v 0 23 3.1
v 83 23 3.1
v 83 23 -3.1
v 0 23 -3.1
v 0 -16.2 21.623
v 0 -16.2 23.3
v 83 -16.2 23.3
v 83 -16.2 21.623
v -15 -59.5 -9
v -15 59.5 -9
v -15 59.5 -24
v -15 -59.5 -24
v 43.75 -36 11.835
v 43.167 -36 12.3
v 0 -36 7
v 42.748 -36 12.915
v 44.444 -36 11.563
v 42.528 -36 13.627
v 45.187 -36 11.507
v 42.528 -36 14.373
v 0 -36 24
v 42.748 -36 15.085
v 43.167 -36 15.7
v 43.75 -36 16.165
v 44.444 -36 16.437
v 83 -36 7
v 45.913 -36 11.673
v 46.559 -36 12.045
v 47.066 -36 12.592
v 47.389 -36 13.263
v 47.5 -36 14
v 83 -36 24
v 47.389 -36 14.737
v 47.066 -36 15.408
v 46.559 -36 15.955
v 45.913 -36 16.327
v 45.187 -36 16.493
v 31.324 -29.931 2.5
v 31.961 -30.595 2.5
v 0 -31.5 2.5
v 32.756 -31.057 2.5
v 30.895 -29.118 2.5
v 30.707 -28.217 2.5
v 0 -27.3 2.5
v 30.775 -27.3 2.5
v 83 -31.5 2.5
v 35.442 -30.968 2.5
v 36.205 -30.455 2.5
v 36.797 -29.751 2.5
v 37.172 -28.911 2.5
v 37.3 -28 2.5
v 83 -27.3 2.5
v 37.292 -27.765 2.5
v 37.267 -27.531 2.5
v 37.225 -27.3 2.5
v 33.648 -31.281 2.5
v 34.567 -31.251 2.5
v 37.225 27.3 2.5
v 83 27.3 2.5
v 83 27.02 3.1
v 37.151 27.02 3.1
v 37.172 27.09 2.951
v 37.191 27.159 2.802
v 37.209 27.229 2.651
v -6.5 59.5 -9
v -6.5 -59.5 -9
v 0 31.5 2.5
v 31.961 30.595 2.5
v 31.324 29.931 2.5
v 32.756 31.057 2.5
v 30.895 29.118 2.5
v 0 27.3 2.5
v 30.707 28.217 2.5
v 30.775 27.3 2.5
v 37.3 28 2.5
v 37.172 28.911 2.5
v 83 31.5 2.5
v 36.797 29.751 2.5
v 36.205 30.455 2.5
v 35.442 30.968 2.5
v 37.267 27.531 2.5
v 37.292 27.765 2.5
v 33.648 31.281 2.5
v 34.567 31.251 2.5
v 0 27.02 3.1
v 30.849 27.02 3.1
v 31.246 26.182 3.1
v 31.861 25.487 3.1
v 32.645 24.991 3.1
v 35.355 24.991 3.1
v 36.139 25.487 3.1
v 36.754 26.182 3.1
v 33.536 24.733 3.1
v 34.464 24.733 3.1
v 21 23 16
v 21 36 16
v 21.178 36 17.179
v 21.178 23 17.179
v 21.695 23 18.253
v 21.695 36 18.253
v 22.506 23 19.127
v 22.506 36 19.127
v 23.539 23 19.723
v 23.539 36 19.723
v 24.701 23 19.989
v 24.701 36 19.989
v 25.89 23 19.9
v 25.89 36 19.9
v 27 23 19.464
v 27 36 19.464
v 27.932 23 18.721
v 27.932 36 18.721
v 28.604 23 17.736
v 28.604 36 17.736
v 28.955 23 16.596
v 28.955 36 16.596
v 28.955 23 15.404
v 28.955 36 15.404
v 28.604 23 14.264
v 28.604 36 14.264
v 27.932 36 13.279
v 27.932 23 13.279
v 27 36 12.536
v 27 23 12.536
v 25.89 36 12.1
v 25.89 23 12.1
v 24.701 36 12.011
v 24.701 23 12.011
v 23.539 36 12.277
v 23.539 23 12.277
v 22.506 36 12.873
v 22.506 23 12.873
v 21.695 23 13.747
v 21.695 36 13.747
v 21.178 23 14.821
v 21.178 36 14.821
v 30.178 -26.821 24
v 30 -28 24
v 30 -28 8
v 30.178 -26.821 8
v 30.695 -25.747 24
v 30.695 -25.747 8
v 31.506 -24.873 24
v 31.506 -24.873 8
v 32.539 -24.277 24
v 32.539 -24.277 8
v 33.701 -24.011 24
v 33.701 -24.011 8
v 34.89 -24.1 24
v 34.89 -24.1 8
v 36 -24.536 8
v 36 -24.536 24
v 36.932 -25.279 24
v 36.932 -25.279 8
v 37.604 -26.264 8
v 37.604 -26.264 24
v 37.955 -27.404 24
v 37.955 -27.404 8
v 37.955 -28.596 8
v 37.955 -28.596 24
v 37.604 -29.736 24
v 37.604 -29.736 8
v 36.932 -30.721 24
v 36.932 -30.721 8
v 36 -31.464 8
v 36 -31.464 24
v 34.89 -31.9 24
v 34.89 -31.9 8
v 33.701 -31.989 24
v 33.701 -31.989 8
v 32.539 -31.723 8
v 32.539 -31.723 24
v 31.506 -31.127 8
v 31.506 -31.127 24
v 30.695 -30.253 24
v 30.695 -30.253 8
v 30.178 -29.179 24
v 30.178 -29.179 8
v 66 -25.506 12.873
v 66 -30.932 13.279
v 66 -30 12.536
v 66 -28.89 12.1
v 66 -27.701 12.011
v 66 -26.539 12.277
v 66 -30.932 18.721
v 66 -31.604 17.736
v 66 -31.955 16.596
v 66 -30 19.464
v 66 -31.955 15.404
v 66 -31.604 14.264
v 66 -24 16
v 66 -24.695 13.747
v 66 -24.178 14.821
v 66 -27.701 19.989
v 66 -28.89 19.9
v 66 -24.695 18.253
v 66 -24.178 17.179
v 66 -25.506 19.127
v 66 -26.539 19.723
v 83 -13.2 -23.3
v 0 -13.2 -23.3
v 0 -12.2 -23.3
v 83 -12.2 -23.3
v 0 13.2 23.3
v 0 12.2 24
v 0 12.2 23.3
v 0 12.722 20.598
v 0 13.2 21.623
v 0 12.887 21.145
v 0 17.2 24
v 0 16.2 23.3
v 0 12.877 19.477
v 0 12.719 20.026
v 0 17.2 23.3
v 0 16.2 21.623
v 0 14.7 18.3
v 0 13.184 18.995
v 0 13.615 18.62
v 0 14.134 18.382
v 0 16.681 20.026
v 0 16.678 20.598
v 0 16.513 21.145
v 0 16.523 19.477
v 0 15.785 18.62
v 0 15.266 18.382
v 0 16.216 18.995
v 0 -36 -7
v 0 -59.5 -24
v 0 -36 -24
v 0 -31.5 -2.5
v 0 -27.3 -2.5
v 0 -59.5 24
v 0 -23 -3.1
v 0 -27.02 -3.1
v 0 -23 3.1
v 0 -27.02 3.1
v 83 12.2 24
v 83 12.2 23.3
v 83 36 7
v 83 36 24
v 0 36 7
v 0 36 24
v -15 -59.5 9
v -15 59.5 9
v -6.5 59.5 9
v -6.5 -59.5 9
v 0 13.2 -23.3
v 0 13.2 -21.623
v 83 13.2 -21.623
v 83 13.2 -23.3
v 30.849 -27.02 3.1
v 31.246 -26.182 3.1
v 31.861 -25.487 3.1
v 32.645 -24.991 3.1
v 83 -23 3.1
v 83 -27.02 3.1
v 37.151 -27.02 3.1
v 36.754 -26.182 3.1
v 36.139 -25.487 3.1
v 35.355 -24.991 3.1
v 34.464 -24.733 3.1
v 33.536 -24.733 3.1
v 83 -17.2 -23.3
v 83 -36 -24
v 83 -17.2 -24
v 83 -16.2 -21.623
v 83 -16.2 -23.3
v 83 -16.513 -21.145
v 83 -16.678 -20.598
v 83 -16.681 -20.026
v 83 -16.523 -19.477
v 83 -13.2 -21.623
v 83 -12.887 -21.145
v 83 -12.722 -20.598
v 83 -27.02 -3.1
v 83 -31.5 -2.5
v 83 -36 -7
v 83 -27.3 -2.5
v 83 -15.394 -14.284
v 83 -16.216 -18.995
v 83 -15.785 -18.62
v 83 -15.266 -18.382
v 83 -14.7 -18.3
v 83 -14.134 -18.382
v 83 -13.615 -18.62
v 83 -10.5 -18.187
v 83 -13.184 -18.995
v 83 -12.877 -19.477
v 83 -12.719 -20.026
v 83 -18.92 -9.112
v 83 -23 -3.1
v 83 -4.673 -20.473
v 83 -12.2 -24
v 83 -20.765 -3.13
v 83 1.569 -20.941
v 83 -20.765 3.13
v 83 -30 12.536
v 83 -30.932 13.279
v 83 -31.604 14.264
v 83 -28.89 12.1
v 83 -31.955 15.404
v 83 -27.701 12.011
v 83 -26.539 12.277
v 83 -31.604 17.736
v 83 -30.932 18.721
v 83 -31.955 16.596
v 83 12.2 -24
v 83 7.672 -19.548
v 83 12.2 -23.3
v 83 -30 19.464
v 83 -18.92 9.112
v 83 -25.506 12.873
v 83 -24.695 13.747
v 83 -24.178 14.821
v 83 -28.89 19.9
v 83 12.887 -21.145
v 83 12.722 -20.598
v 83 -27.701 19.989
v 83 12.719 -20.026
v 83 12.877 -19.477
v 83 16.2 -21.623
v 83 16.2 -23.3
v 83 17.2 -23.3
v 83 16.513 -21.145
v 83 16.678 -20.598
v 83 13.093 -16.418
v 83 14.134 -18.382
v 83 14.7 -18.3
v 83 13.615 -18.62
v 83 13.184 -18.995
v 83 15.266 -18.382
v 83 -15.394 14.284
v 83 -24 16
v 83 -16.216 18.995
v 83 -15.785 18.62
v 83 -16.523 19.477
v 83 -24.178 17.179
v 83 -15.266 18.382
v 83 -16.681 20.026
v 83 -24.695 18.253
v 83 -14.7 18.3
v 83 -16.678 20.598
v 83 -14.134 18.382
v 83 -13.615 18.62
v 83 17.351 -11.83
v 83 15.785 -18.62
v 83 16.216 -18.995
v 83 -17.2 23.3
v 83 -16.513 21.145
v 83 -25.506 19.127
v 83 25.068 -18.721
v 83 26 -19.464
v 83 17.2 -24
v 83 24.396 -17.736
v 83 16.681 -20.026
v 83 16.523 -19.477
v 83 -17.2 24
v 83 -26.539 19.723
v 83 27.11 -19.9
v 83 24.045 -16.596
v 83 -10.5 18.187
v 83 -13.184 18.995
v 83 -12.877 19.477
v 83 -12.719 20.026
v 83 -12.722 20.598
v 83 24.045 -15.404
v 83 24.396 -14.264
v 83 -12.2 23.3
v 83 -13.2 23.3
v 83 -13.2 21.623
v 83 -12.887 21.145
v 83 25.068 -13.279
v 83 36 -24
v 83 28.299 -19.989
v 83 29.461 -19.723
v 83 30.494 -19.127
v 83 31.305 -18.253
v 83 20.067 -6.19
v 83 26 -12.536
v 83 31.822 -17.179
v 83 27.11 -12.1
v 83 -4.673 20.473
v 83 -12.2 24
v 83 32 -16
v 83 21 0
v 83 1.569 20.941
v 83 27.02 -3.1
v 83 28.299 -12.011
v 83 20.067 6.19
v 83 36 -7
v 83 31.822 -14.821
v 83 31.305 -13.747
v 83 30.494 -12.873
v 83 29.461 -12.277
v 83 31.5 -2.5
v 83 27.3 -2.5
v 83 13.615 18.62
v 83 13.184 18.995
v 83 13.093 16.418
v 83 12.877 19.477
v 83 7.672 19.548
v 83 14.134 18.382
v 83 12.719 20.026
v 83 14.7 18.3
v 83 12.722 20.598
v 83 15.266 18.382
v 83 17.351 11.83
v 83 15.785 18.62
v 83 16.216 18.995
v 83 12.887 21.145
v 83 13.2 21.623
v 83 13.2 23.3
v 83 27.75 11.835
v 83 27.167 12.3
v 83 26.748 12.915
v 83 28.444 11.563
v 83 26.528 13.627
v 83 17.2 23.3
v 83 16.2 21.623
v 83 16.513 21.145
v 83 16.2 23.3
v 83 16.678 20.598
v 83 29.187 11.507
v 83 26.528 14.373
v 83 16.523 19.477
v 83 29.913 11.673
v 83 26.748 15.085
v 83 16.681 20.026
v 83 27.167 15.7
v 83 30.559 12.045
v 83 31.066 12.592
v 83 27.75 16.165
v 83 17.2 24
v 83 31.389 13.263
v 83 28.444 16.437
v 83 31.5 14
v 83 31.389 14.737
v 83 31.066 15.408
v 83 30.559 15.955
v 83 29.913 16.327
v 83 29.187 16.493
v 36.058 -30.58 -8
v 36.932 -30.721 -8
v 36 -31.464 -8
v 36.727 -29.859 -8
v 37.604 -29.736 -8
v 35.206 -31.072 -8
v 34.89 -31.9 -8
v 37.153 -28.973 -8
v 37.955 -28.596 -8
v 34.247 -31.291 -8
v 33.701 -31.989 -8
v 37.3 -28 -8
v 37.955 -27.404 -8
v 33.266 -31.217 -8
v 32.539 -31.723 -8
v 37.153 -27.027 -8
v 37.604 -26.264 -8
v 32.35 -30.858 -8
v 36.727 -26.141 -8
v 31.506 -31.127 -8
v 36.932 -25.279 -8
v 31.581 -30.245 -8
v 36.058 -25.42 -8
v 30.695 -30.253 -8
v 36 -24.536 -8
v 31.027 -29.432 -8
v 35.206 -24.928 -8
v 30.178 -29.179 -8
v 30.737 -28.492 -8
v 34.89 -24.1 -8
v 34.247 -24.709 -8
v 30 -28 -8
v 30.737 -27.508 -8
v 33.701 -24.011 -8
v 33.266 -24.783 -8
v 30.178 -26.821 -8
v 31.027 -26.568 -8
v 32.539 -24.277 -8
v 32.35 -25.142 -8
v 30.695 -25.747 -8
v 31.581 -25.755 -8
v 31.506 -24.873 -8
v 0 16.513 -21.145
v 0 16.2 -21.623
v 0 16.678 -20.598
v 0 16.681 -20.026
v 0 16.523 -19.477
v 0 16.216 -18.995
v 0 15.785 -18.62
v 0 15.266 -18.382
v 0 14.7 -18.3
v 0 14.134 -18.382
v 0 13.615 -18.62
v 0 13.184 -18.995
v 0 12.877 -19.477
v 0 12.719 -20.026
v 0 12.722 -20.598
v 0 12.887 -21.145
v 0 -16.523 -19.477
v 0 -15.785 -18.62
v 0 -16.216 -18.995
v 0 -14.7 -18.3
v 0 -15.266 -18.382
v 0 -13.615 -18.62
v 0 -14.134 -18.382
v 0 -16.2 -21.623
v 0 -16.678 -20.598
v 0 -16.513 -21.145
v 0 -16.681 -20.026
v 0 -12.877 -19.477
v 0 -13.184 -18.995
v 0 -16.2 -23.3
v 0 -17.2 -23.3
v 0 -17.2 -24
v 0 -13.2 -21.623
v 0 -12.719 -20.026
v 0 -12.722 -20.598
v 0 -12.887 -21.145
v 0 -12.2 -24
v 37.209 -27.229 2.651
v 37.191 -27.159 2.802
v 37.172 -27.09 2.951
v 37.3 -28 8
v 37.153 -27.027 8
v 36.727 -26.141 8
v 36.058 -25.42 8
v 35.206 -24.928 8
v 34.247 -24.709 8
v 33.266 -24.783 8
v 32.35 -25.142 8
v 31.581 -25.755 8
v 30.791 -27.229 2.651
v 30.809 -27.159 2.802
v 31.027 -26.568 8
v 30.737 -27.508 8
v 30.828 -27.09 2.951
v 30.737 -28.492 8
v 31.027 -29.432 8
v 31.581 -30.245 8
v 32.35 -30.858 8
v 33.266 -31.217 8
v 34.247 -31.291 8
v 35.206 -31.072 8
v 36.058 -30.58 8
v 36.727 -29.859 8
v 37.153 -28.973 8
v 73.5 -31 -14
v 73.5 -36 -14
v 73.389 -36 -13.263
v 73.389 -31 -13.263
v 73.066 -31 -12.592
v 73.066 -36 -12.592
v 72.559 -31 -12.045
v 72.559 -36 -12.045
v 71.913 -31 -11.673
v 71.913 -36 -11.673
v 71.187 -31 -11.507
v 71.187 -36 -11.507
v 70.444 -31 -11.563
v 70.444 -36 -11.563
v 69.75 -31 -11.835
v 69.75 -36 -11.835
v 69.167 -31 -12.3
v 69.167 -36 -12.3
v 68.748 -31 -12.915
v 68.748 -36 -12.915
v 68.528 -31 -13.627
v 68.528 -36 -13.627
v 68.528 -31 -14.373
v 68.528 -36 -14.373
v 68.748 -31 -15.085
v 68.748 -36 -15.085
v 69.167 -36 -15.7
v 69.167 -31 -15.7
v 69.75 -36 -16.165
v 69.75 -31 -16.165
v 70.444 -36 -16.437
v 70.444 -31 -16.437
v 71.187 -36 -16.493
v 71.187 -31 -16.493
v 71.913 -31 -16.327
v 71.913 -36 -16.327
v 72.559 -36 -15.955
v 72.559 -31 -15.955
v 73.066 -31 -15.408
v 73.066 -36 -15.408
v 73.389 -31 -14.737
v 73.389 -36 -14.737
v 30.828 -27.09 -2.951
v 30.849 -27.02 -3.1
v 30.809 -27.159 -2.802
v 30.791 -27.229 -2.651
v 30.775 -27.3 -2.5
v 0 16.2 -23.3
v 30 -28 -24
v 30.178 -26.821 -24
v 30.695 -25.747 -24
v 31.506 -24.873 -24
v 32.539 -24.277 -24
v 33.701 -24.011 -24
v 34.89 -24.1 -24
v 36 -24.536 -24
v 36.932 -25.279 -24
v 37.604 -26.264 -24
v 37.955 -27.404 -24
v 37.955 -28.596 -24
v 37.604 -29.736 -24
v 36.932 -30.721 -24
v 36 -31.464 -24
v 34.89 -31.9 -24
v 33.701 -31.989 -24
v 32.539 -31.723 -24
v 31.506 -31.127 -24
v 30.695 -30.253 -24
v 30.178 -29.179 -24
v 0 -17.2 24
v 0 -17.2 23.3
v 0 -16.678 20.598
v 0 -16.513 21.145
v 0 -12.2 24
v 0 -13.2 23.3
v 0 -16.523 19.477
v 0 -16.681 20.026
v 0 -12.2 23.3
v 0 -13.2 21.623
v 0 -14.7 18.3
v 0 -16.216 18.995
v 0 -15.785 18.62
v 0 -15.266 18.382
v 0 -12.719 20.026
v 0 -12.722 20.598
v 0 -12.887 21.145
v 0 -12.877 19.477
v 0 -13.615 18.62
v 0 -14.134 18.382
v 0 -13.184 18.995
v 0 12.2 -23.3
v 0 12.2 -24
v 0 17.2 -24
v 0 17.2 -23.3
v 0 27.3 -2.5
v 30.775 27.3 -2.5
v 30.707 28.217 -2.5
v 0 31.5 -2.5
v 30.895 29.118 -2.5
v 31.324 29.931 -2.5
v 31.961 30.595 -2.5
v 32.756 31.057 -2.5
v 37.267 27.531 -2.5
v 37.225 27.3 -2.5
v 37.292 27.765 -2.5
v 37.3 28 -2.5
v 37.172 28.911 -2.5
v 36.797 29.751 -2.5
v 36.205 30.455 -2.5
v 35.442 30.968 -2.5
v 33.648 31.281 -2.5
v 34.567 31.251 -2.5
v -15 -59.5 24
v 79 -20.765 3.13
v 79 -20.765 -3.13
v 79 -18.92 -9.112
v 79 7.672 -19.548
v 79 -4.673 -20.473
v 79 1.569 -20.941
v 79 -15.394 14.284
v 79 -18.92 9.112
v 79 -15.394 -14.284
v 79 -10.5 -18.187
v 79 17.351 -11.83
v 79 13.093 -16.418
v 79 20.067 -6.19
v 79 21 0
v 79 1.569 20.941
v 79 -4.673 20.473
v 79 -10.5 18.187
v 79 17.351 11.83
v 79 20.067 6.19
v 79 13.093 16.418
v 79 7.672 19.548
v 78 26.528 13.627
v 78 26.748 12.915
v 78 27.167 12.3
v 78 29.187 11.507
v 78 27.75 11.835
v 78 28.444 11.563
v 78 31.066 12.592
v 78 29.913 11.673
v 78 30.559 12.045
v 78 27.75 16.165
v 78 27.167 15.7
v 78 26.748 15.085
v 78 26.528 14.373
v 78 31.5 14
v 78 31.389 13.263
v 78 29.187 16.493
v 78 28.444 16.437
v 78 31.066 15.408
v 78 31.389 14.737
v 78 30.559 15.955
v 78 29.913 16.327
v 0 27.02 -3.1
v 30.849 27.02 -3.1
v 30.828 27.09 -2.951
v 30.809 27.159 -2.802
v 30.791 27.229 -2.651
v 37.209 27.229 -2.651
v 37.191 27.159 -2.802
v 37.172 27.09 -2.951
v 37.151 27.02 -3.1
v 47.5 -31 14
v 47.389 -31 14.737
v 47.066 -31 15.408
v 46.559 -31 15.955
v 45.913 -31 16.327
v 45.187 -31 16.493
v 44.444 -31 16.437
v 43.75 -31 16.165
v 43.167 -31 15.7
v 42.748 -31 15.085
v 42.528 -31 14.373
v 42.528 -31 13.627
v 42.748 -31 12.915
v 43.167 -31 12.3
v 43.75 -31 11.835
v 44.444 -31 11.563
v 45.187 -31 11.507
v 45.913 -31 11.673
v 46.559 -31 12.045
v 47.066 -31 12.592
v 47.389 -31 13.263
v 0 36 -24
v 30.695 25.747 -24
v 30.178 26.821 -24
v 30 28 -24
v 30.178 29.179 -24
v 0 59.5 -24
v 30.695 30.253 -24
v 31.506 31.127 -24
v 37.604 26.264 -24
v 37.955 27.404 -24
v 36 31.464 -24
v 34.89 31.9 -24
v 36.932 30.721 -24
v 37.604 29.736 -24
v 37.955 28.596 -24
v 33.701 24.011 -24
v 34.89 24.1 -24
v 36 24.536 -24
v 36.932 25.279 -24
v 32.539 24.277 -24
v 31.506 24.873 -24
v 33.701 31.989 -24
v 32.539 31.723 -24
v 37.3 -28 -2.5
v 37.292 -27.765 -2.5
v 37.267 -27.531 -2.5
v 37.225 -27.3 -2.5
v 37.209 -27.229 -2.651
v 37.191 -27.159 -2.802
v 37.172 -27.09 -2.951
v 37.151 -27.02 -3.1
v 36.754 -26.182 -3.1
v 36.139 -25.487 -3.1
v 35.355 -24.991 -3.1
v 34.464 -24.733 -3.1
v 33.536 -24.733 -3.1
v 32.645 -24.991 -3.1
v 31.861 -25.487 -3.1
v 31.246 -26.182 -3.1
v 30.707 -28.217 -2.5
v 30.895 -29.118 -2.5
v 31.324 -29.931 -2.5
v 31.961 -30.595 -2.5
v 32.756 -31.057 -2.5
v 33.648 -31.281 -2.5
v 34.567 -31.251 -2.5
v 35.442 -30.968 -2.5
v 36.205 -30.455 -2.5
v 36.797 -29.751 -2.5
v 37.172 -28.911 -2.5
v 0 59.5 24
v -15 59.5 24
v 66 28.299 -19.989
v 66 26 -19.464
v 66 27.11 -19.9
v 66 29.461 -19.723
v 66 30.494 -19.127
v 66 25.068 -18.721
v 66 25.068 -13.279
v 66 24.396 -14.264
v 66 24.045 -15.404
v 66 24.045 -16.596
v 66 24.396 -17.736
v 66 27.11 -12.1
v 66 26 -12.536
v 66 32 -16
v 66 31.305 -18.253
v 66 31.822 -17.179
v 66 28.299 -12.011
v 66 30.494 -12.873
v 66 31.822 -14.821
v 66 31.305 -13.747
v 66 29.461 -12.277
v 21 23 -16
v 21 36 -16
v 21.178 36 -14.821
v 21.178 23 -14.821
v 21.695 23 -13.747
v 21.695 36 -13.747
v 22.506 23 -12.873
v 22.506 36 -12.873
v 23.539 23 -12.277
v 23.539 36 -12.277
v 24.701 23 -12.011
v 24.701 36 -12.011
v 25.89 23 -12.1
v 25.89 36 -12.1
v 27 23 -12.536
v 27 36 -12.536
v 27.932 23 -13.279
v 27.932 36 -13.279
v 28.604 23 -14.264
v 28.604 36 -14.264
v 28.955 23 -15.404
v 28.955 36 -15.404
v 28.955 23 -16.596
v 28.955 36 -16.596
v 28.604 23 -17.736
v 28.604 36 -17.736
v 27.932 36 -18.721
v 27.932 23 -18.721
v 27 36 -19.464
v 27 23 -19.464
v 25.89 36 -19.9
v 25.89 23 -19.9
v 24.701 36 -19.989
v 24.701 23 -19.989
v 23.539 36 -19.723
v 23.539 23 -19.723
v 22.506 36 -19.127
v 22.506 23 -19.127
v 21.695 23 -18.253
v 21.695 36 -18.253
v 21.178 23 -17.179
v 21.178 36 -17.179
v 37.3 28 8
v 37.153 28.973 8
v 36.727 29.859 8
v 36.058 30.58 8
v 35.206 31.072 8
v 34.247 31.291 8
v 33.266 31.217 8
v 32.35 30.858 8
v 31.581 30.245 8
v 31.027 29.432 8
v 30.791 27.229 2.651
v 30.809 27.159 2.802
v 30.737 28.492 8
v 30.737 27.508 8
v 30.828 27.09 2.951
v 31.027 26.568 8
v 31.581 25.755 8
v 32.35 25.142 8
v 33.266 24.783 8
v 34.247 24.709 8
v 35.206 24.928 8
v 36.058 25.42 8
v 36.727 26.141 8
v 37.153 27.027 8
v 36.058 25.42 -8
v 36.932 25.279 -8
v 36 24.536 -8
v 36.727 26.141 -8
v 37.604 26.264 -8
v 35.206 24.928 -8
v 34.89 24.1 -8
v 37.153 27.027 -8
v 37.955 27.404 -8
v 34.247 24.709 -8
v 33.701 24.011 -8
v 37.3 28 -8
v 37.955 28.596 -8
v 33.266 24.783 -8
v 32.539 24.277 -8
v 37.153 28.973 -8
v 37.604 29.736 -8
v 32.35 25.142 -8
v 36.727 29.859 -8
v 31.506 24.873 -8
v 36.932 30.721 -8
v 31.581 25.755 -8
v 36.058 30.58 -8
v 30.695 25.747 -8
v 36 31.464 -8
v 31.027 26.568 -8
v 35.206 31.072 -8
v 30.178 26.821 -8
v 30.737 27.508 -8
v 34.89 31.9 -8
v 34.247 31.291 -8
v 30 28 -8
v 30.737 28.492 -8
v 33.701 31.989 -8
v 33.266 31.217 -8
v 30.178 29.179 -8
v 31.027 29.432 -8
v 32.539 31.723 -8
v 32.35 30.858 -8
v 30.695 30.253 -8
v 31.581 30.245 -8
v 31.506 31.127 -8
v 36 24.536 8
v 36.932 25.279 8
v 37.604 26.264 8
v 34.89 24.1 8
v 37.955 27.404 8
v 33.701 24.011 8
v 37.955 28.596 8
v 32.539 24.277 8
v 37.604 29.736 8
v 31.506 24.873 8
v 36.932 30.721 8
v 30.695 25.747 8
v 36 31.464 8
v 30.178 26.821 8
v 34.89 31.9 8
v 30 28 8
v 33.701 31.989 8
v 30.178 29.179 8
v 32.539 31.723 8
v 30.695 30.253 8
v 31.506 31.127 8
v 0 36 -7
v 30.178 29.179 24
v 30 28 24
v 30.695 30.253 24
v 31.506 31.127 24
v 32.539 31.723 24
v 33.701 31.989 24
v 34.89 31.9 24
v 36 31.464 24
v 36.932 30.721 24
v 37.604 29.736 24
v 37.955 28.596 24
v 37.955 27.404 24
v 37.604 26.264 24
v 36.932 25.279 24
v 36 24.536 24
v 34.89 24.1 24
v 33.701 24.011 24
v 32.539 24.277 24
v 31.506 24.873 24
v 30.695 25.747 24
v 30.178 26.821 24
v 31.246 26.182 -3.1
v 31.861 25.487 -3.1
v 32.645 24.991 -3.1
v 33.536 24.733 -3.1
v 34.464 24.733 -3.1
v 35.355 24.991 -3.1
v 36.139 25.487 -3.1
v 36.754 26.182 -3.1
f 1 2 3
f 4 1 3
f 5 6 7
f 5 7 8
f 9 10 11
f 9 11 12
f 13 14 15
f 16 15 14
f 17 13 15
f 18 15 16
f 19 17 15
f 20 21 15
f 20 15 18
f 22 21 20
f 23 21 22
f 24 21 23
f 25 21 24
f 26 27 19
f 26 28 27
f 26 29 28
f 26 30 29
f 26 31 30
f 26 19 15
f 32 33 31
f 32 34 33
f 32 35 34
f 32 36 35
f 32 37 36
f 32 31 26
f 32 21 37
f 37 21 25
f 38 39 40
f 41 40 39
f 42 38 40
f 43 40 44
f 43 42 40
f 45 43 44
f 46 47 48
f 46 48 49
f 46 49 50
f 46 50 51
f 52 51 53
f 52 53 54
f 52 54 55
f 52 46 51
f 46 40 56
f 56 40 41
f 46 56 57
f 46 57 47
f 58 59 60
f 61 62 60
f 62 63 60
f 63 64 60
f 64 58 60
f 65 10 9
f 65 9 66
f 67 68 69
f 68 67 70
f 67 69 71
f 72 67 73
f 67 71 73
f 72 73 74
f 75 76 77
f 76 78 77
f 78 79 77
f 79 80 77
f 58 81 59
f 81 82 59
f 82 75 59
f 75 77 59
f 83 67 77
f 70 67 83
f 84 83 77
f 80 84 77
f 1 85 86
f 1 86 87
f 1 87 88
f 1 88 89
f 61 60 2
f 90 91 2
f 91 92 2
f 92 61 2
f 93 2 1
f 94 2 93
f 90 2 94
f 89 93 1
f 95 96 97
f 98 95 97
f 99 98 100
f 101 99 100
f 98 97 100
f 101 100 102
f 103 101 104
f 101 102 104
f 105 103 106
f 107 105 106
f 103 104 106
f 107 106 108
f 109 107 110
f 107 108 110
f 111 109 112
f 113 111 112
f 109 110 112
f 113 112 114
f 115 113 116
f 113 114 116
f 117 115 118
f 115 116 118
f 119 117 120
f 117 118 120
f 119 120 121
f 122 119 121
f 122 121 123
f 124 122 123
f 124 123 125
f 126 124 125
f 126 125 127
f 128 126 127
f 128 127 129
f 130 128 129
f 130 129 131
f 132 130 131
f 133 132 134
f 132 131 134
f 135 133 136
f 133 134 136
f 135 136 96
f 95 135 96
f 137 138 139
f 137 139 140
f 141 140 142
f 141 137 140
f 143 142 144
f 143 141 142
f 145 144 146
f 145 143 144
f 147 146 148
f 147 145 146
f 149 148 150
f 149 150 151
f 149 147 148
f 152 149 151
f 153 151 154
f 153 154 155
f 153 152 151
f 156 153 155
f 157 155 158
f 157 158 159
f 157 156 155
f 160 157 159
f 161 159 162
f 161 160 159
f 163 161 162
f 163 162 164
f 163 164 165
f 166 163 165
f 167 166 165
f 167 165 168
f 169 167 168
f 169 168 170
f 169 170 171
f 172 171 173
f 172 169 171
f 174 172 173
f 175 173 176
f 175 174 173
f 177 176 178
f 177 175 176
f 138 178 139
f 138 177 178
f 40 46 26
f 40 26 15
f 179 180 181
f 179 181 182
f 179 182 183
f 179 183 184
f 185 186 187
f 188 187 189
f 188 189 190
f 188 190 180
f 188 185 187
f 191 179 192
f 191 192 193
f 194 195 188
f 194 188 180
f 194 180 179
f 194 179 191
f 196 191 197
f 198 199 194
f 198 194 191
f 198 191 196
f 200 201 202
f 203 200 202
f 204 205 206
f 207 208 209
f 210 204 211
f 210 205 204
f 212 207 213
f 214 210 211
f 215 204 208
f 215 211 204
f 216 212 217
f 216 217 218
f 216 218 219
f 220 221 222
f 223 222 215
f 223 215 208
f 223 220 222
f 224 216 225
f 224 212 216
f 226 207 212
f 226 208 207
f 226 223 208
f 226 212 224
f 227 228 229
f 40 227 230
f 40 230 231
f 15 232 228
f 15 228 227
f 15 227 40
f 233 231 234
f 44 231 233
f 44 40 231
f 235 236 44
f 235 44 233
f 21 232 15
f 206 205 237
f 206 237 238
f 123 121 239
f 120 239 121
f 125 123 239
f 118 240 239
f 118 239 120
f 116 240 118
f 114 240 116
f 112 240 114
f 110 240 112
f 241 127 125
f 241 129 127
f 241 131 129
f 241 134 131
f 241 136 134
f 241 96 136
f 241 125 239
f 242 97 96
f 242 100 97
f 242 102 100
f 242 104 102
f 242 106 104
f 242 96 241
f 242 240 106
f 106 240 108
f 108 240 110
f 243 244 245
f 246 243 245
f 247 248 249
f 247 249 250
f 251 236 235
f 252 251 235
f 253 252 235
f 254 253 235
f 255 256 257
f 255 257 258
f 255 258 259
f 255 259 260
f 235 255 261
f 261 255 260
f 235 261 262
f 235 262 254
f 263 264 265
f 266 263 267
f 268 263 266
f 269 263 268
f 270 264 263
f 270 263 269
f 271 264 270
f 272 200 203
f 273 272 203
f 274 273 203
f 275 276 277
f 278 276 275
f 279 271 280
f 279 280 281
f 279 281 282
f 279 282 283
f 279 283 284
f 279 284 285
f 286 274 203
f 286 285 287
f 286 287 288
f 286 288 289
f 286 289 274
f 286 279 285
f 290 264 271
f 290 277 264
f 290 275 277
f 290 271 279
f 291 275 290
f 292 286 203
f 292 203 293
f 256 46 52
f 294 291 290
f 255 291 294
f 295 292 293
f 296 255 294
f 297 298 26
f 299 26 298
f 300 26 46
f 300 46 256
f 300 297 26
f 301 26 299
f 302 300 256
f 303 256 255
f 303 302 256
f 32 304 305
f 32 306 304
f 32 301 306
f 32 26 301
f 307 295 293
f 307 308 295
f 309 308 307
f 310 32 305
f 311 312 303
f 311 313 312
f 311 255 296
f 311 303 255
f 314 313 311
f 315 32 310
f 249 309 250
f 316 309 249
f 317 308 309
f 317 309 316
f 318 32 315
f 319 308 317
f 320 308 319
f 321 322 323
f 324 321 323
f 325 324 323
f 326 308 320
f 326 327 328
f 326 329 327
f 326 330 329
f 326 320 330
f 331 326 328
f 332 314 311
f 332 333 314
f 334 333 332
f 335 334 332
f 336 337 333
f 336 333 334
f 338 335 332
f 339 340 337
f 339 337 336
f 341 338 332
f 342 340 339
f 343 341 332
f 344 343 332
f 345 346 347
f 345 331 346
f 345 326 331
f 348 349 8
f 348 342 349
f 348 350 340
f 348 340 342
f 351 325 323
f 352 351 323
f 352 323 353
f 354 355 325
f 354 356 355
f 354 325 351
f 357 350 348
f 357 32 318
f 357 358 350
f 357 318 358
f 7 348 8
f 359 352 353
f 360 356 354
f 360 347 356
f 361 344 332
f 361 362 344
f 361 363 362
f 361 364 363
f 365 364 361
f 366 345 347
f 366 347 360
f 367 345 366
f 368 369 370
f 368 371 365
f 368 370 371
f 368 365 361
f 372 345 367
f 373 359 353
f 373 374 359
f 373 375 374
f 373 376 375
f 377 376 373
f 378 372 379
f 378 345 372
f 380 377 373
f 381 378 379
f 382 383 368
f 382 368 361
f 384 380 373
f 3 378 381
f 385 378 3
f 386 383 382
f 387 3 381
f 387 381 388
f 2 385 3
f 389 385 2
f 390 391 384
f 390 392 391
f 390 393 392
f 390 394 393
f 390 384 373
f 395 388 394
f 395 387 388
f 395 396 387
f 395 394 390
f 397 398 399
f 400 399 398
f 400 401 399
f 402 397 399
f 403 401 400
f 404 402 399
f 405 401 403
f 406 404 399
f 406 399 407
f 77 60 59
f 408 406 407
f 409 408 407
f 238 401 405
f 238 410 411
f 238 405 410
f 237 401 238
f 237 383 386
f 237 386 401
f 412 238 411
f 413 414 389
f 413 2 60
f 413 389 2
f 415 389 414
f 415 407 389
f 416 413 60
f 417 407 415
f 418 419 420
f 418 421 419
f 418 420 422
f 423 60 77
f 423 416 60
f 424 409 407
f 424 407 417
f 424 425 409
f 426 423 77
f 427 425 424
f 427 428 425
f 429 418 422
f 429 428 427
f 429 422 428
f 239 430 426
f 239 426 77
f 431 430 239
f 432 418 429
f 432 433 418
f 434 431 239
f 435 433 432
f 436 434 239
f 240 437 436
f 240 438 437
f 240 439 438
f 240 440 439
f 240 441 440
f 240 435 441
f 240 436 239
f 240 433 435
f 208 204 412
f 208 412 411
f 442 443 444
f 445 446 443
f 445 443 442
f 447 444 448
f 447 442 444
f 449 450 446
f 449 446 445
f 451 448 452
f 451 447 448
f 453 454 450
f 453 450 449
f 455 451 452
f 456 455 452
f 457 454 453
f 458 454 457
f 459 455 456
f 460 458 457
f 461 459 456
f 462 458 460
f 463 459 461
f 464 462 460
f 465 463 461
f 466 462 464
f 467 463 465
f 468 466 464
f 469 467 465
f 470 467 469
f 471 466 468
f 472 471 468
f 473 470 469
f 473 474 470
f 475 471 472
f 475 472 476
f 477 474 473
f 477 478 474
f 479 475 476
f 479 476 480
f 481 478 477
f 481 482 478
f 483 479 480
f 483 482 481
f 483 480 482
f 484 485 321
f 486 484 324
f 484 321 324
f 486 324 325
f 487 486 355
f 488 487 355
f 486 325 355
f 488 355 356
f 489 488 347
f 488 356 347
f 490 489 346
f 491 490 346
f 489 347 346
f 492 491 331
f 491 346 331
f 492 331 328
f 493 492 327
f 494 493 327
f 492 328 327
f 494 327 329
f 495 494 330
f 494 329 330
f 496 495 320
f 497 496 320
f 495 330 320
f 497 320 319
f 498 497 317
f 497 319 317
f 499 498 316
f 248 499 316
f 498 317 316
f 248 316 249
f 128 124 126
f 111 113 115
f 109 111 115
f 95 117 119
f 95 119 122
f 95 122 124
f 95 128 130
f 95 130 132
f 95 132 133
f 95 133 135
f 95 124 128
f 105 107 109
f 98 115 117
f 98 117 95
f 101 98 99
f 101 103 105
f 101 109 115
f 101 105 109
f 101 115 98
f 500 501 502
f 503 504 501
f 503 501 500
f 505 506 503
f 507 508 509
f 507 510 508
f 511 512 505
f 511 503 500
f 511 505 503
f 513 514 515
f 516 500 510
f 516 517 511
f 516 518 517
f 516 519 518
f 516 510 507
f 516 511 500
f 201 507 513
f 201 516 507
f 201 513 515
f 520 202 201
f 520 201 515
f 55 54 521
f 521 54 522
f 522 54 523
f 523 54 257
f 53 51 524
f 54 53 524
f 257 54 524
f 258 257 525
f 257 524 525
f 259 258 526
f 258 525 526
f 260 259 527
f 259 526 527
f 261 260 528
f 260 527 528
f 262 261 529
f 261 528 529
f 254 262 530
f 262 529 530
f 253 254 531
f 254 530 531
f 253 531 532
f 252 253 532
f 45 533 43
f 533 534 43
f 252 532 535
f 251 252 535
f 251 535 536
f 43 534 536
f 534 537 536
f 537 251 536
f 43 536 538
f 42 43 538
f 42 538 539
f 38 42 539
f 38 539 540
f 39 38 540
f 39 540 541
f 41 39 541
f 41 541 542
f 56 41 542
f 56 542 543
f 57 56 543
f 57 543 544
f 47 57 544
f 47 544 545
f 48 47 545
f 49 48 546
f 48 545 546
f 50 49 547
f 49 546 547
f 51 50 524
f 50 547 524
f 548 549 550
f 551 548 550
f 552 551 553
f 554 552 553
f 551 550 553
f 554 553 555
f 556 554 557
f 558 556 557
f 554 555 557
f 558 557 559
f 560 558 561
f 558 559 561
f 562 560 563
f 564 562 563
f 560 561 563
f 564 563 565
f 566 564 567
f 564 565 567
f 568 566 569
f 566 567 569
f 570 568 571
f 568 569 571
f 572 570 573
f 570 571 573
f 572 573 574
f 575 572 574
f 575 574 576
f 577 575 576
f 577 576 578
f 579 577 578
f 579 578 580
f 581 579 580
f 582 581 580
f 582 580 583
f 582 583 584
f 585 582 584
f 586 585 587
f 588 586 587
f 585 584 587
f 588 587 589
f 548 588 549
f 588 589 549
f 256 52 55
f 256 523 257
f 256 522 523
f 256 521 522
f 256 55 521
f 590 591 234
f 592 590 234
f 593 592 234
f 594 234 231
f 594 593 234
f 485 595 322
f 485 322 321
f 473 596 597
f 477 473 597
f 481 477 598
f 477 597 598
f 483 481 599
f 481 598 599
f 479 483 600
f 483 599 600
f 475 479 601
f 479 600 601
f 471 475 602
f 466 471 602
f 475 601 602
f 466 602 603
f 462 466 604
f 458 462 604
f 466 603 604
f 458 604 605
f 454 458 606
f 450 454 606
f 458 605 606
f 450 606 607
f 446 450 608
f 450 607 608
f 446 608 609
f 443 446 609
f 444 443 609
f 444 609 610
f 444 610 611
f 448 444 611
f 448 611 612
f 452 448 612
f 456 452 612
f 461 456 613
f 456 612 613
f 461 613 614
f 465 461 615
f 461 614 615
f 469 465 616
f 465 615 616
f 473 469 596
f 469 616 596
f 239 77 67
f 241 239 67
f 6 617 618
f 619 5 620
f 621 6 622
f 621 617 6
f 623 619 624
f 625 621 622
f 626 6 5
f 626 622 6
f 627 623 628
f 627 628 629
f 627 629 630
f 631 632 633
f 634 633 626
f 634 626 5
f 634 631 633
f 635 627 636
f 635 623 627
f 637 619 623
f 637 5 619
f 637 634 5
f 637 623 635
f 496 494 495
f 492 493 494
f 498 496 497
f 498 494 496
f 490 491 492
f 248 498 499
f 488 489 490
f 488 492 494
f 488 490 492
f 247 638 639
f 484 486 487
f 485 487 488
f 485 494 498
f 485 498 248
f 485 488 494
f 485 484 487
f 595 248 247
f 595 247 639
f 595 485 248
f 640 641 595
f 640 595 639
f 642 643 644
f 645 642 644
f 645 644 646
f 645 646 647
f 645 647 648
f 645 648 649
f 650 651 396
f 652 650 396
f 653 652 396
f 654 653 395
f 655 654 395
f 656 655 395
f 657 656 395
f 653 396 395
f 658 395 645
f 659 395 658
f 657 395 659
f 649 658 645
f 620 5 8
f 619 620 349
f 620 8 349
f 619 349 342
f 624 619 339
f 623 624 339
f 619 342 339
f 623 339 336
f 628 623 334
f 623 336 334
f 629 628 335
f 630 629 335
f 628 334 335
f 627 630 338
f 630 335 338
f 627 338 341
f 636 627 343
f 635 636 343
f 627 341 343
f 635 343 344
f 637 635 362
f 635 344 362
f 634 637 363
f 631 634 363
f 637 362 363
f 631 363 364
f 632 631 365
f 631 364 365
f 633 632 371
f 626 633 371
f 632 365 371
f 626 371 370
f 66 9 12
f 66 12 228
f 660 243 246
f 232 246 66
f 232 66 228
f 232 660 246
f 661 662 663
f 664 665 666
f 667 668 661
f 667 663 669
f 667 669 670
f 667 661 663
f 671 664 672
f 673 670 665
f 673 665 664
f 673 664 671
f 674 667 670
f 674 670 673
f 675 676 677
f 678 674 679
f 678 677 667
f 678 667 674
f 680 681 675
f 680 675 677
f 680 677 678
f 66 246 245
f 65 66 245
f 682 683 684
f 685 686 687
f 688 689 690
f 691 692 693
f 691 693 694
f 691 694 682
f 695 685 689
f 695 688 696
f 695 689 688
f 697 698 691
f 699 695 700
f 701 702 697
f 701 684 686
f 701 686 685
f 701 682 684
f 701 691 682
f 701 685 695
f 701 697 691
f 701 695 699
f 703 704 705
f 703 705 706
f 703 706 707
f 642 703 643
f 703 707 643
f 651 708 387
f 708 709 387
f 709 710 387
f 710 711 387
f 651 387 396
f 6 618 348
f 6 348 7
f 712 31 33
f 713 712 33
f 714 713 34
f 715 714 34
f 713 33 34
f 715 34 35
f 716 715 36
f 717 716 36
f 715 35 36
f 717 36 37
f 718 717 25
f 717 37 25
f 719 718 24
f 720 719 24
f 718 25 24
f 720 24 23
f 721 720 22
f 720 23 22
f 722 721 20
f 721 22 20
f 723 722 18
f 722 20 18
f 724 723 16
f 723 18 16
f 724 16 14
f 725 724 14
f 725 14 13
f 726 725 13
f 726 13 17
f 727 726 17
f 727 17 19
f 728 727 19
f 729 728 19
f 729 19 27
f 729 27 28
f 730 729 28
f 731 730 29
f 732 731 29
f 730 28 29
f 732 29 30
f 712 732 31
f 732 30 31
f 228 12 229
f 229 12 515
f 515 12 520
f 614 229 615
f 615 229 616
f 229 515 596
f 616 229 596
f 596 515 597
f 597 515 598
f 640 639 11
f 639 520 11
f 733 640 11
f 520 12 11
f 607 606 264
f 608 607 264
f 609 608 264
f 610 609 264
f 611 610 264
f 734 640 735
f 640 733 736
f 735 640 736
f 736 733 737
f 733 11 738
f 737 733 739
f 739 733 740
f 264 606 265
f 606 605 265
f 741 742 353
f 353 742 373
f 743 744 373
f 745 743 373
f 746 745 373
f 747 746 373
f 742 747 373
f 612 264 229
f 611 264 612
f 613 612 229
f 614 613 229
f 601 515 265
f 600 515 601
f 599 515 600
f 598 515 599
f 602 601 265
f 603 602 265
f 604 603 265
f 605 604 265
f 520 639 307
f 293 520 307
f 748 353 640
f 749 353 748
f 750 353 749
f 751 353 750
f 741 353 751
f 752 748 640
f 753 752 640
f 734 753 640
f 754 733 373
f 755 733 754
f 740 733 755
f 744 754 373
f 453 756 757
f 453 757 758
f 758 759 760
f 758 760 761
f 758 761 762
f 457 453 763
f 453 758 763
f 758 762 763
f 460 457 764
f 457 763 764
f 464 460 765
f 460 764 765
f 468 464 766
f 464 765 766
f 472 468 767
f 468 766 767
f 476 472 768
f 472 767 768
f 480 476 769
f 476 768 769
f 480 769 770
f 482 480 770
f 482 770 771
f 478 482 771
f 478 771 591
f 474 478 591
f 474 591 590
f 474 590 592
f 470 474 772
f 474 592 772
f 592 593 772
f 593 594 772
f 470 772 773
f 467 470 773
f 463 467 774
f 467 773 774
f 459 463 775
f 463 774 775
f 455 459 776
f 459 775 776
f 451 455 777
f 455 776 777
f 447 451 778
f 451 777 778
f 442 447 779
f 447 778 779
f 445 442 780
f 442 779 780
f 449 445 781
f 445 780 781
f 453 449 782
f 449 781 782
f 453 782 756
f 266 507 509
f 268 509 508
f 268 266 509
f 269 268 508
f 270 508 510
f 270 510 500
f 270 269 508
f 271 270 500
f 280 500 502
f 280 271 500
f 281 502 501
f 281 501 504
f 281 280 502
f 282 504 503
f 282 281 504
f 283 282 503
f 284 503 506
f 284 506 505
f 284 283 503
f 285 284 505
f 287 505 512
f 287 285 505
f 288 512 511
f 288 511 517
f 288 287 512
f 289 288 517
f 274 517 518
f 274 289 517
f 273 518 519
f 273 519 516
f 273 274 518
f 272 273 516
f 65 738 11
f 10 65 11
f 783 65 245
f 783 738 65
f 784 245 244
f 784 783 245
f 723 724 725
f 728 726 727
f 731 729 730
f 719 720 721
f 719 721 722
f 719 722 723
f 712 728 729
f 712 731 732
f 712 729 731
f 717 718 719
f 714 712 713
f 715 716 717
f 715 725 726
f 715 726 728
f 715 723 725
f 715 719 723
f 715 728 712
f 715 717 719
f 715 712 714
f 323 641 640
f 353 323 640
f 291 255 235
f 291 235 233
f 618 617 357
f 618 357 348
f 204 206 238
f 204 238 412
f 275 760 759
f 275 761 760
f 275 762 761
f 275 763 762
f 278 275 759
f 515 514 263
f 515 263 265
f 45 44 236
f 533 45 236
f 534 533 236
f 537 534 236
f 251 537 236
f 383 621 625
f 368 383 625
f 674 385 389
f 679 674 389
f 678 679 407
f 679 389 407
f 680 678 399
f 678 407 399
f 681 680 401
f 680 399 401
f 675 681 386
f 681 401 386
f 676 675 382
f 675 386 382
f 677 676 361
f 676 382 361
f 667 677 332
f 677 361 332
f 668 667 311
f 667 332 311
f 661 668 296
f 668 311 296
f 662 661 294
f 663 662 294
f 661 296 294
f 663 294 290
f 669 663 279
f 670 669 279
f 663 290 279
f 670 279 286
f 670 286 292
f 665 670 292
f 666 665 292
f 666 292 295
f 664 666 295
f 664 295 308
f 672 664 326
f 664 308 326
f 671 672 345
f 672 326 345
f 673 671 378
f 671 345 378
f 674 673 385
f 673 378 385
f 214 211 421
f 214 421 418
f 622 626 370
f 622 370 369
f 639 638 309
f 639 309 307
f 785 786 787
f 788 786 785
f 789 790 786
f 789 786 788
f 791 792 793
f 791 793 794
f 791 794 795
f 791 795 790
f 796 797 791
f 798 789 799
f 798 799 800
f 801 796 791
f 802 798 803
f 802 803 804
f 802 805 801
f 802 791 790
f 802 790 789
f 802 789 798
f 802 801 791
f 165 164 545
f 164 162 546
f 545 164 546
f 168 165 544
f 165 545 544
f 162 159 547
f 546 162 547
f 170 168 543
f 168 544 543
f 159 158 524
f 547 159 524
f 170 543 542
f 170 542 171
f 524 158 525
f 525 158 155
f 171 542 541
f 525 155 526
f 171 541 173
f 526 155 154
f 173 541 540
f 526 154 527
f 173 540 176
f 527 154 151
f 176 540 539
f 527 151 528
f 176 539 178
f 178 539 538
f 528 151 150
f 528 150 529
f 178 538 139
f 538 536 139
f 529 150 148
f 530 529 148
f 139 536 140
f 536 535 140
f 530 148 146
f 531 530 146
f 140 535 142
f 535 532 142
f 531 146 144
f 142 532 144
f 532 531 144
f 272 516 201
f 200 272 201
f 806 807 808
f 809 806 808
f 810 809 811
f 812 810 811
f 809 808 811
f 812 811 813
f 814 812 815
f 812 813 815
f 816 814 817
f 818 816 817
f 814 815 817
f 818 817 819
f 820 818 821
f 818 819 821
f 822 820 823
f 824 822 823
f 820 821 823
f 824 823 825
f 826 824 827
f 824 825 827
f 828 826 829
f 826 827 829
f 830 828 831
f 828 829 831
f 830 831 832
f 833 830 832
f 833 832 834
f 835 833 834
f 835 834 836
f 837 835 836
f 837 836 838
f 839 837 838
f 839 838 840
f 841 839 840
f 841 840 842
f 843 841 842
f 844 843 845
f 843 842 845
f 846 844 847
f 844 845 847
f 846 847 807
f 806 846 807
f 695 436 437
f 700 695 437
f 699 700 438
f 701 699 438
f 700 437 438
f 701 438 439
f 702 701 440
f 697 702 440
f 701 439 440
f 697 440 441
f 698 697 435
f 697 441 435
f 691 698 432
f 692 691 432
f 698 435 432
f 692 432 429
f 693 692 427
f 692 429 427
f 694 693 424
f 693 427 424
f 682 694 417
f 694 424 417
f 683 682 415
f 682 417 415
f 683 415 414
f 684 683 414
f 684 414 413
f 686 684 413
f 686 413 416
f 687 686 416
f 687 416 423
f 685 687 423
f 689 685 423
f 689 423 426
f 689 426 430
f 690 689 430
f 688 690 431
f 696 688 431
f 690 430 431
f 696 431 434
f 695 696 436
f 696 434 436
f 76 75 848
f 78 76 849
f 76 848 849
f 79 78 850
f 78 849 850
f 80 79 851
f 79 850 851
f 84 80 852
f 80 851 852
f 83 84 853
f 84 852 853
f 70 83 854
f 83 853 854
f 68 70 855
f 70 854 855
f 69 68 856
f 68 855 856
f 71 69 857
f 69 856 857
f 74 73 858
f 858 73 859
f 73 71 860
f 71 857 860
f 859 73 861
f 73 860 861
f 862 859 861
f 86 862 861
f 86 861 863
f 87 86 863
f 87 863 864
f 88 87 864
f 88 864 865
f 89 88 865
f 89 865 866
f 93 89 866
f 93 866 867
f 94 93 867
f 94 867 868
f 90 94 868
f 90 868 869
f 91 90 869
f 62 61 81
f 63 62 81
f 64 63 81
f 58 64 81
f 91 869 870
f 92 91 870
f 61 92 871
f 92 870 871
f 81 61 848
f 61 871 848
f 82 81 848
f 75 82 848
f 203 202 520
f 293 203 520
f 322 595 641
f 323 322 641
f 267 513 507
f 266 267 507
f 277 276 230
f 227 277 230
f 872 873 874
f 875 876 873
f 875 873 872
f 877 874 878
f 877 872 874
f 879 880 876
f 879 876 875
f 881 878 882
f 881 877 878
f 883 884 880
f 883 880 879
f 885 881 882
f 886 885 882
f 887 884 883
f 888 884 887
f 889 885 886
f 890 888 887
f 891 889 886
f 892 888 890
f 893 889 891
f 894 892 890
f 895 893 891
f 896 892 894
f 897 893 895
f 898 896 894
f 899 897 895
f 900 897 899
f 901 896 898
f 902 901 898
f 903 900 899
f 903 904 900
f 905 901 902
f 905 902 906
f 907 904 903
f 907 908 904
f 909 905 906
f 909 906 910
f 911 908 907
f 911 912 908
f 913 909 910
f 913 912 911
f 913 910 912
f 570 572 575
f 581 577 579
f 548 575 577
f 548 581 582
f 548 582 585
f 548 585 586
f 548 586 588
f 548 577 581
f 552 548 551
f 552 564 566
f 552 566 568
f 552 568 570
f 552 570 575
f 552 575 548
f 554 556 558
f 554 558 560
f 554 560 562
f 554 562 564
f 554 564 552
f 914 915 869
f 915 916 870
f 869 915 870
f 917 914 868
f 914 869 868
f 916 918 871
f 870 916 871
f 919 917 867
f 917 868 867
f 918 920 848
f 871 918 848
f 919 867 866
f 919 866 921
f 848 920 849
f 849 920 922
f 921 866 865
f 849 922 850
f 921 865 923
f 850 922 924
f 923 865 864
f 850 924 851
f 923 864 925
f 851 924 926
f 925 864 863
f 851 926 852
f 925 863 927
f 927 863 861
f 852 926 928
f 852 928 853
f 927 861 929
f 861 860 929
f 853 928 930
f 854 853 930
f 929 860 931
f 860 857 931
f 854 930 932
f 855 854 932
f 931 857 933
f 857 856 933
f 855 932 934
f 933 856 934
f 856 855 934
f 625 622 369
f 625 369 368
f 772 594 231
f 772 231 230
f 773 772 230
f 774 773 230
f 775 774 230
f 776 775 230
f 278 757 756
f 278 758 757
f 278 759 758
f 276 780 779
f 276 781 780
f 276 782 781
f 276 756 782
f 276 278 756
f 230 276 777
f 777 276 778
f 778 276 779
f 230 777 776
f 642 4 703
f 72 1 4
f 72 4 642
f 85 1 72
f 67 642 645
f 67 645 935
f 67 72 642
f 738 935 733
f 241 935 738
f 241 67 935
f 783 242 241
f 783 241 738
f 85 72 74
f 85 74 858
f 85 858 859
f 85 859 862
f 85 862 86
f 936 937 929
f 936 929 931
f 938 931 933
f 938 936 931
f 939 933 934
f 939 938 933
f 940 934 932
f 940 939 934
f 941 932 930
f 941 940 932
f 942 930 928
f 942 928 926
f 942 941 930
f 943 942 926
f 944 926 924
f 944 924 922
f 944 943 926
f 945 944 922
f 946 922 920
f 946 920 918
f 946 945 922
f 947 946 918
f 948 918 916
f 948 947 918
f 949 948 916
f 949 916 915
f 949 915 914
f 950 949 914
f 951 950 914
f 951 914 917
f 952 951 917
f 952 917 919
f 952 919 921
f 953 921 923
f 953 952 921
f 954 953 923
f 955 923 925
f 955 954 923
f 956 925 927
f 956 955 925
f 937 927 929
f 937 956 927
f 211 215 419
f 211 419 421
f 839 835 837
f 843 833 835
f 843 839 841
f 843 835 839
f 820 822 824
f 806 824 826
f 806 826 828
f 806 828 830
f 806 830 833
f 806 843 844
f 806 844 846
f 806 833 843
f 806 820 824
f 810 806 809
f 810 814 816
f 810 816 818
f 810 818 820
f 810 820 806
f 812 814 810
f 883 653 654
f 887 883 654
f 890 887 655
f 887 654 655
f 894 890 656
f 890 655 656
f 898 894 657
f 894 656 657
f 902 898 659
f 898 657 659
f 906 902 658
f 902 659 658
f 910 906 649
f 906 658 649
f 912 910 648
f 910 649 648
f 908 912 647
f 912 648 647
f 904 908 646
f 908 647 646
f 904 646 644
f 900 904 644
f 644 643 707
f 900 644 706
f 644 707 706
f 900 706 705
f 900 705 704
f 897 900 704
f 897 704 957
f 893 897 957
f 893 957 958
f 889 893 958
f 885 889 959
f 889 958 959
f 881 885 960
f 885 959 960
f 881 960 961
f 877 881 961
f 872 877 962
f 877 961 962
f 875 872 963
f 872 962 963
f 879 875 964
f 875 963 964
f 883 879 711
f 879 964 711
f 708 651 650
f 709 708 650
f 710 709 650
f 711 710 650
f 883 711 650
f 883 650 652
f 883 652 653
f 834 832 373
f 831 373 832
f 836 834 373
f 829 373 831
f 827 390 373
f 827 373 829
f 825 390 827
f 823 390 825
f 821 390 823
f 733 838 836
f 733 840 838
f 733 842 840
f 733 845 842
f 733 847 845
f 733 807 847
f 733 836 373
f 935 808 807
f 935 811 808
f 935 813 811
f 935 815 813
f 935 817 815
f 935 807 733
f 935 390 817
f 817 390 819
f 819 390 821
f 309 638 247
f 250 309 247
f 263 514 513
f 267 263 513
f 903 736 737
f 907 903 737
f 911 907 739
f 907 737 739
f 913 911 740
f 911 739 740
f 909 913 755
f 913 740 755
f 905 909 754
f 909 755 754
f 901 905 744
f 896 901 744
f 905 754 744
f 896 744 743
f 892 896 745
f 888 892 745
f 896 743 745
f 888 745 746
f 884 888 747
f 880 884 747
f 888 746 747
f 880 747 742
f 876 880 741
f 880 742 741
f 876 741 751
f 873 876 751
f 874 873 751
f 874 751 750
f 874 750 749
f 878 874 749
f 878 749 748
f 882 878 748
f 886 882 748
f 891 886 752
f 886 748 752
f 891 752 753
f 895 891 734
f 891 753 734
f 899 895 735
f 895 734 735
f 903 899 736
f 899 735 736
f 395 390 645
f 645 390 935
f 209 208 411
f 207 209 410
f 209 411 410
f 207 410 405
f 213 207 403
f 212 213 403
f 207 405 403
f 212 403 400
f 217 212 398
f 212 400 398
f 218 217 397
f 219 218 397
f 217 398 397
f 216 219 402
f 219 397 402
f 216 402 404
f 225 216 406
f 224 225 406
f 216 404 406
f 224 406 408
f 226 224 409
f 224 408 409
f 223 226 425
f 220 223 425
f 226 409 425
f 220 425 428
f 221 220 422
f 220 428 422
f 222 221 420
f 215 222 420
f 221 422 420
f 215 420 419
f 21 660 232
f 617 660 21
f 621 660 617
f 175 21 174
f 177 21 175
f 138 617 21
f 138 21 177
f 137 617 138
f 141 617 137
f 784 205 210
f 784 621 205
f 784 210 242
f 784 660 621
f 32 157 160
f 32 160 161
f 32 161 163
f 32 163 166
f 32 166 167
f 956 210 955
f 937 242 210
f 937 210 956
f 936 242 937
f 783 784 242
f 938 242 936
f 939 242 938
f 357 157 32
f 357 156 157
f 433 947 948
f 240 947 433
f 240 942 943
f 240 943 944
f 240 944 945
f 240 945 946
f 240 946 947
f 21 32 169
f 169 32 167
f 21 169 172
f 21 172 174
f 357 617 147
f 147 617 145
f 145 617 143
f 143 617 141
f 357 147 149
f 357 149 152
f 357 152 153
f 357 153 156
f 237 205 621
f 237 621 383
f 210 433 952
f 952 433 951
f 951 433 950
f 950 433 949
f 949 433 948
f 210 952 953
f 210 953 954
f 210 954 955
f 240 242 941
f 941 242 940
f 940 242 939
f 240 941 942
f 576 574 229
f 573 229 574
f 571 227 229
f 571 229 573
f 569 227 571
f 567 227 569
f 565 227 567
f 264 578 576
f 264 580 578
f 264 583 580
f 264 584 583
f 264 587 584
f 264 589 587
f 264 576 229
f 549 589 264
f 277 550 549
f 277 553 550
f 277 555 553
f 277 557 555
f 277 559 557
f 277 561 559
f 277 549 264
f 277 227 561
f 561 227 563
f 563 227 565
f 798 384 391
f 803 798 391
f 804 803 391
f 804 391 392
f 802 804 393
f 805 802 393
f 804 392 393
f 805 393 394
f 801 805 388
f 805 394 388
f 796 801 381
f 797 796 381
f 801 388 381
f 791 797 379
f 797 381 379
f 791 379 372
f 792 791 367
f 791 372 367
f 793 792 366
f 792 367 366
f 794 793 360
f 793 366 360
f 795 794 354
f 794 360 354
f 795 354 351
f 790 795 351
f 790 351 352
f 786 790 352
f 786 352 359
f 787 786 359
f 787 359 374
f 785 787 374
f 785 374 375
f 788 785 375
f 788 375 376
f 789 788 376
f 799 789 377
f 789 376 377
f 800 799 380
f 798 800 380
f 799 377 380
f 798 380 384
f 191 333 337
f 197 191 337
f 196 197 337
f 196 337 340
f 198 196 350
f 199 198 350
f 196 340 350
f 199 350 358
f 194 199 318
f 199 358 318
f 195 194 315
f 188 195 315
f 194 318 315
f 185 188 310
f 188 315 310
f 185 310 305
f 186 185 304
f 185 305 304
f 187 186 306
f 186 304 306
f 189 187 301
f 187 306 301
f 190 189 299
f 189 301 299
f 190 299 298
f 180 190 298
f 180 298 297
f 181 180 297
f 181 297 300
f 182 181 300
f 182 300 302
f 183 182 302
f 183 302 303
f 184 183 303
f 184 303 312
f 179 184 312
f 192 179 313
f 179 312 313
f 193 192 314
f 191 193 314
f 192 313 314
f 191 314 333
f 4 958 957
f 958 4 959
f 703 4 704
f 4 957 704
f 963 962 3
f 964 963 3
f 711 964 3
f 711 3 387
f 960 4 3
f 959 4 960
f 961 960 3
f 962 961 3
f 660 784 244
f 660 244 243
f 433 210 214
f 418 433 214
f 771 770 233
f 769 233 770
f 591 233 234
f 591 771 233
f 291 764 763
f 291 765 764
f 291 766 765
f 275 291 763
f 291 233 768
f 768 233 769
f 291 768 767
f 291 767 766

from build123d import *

# Parameters (mm, degrees)
MAIN_DEPTH                   = 24
SK_RECESS_R                  = 21
RECESS_DEPTH                 = 4
NUT_DEPTH                    = 83
SK_HOLE1_R                   = 2.5
HOLE1_DEPTH                  = 5
SK_HOLE_T_R                  = 4
HOLE_T_DEPTH                 = 17
SK_HOLE2_R                   = 4
HOLE2_DEPTH                  = 13
SK_HOLE3_R                   = 4
HOLE3_DEPTH                  = 16
SKETCH1_R                    = 3.3
THRUHOLES_DEPTH              = 113.841703284
SK_PRONG_GRV_W               = 8.5
SK_PRONG_GRV_H               = 119
PRONG_GRV_DEPTH              = 9
SK_HOLE4_R                   = 2.5
HOLE4_DEPTH                  = 5
GRV_REACH                    = 119.133
F_32_40SWITCHCHAMFER_SIZE    = 4.5
SKETCH5_W                    = 0.7
SKETCH5_H                    = 5
F_32_40SWITCHCUTDETAIL_DEPTH = 105.905910224
EXTRUDE1_START               = 5
SKETCH6_R                    = 2.5
EXTRUDE1_DEPTH               = 5
SKETCH9_R                    = 2.5
HOLE_5_DEPTH                 = 5


with BuildPart() as part:
    # sk-main → main (new, symmetric)
    with BuildSketch(Plane.XY):
        Polygon((0, -36), (83, -36), (83, 36), (0, 36), (0, 59.5), (-15, 59.5), (-15, -59.5), (0, -59.5), align=None)
    extrude(amount=MAIN_DEPTH, both=True)

    # sk-recess → recess (cut)
    with BuildSketch(Plane(origin=(83, 0, 0), x_dir=(0, 0, -1), z_dir=(1, 0, 0))):
        with Locations(Location((0, 0, 0), (0, 0, 90))):
            Circle(SK_RECESS_R)
    extrude(amount=-RECESS_DEPTH, mode=Mode.SUBTRACT)

    # sk-NUT → NUT (cut)
    with BuildSketch(Plane(origin=(83, 0, 0), x_dir=(0, 0, -1), z_dir=(1, 0, 0))):
        with BuildLine():
            Line((-21.622875656, 16.2), (-24, 16.2))
            Line((-24, 16.2), (-24, 13.2))
            Line((-24, 13.2), (-21.622875656, 13.2))
            ThreePointArc((-21.622875656, 13.2), (-18.3, 14.7), (-21.622875656, 16.2))
        make_face()
        with BuildLine():
            Line((-21.622875656, -13.2), (-24, -13.2))
            Line((-24, -13.2), (-24, -16.2))
            Line((-24, -16.2), (-21.622875656, -16.2))
            ThreePointArc((-21.622875656, -16.2), (-18.3, -14.7), (-21.622875656, -13.2))
        make_face()
        with BuildLine():
            Line((21.622875656, 13.2), (24, 13.2))
            Line((24, 13.2), (24, 16.2))
            Line((24, 16.2), (21.622875656, 16.2))
            ThreePointArc((21.622875656, 16.2), (18.3, 14.7), (21.622875656, 13.2))
        make_face()
        with BuildLine():
            Line((21.622875656, -13.2), (24, -13.2))
            Line((24, -13.2), (24, -16.2))
            Line((24, -16.2), (21.622875656, -16.2))
            ThreePointArc((21.622875656, -16.2), (18.3, -14.7), (21.622875656, -13.2))
        make_face()
    extrude(amount=-NUT_DEPTH, mode=Mode.SUBTRACT)

    # sk-hole1 → hole1 (cut)
    with BuildSketch(Plane(origin=(83, 0, 0), x_dir=(0, 0, -1), z_dir=(1, 0, 0))):
        with Locations(Location((-14, 29, 0), (0, 0, 90))):
            Circle(SK_HOLE1_R)
    extrude(amount=-HOLE1_DEPTH, mode=Mode.SUBTRACT)

    # sk-hole_t → hole_t (cut)
    with BuildSketch(Plane(origin=(83, 0, 0), x_dir=(0, 0, -1), z_dir=(1, 0, 0))):
        with Locations(Location((-16, -28, 0), (0, 0, 90))):
            Circle(SK_HOLE_T_R)
        with Locations(Location((16, 28, 0), (0, 0, 90))):
            Circle(SK_HOLE_T_R)
    extrude(amount=-HOLE_T_DEPTH, mode=Mode.SUBTRACT)

    # sk-hole2 → hole2 (cut)
    with BuildSketch(Plane(origin=(0, 36, 0), x_dir=(-1, 0, 0), z_dir=(0, 1, 0))):
        with Locations((-25, -16)):
            Circle(SK_HOLE2_R)
        with Locations((-25, 16)):
            Circle(SK_HOLE2_R)
    extrude(amount=-HOLE2_DEPTH, mode=Mode.SUBTRACT)

    # sk-hole3 → hole3 (cut)
    with BuildSketch(Plane(origin=(0, 0, -24), x_dir=(-1, 0, 0), z_dir=(0, 0, -1))):
        with Locations((-34, 28)):
            Circle(SK_HOLE3_R)
        with Locations((-34, -28)):
            Circle(SK_HOLE3_R)
    hole3 = extrude(amount=-HOLE3_DEPTH, mode=Mode.SUBTRACT)

    # Mirror1: hole3 across plane
    add(hole3.mirror(Plane.XY), mode=Mode.SUBTRACT)

    # Sketch1 → ThruHoles (cut, through all)
    with BuildSketch(Plane.XY.offset(24)):
        with Locations((34, 28)):
            Circle(SKETCH1_R)
        with Locations((34, -28)):
            Circle(SKETCH1_R)
    extrude(amount=-THRUHOLES_DEPTH, mode=Mode.SUBTRACT)

    # sk-prong_grv → prong_grv (cut, symmetric)
    with BuildSketch(Plane.XY):
        with Locations((-10.75, 0)):
            Rectangle(SK_PRONG_GRV_W, SK_PRONG_GRV_H)
    extrude(amount=PRONG_GRV_DEPTH, both=True, mode=Mode.SUBTRACT)

    # sk-hole4 → hole4 (cut)
    with BuildSketch(Plane.XZ.offset(36)):
        with Locations((45, 14)):
            Circle(SK_HOLE4_R)
        with Locations((71, -14)):
            Circle(SK_HOLE4_R)
    extrude(amount=-HOLE4_DEPTH, mode=Mode.SUBTRACT)

    # grv: up to this face of the body (flat: up to its plane)
    grv_end = Plane(part.part.faces().sort_by_distance((0, 47.75, 0))[0])
    # sk-grv → grv (cut, up to the picked face)
    with BuildSketch(Plane(origin=(83, 0, 0), x_dir=(0, 0, -1), z_dir=(1, 0, 0)), mode=Mode.PRIVATE) as grv_sk1:
        Polygon((-2.5, 36), (-2.5, 27.3), (-3.1, 27.020215405), (-3.1, 23), (3.1, 23), (3.1, 27.020215405), (2.5, 27.3), (2.5, 36), align=None)
    grv_tool1 = split(extrude(grv_sk1.sketch, amount=-GRV_REACH, mode=Mode.PRIVATE), bisect_by=grv_end, keep=Keep.BOTH, mode=Mode.PRIVATE)
    # sk-grv → grv (cut, up to the picked face)
    with BuildSketch(Plane(origin=(83, 0, 0), x_dir=(0, 0, -1), z_dir=(1, 0, 0)), mode=Mode.PRIVATE) as grv_sk2:
        Polygon((3.1, -23), (3.1, -27.020215405), (2.5, -27.3), (2.5, -36), (-2.5, -36), (-2.5, -27.3), (-3.1, -27.020215405), (-3.1, -23), align=None)
    grv_tool2 = split(extrude(grv_sk2.sketch, amount=-GRV_REACH, mode=Mode.PRIVATE), bisect_by=grv_end, keep=Keep.BOTH, mode=Mode.PRIVATE)
    add(grv_tool1.solids().sort_by(Axis((83, 29.184807, 0), (-1, 0, 0)))[0], mode=Mode.SUBTRACT)
    add(grv_tool2.solids().sort_by(Axis((83, -29.184807, 0), (-1, 0, 0)))[0], mode=Mode.SUBTRACT)

    # 32-40SwitchChamfer
    f_32_40switchchamfer_edges = [part.edges().sort_by_distance(p)[0] for p in [
        (41.5, 36, -2.5),
        (41.5, 36, 2.5),
        (41.5, -36, 2.5),
        (41.5, -36, -2.5),
    ]]
    chamfer(f_32_40switchchamfer_edges, length=F_32_40SWITCHCHAMFER_SIZE)

    # Sketch5 → 32-40SwitchCutDetail (cut, through all)
    with BuildSketch(Plane(origin=(0, 0, 0), x_dir=(0, 0, -1), z_dir=(1, 0, 0))):
        with Locations((-23.65, 14.7)):
            Rectangle(SKETCH5_W, SKETCH5_H)
        with Locations((23.65, 14.7)):
            Rectangle(SKETCH5_W, SKETCH5_H)
        with Locations((23.65, -14.7)):
            Rectangle(SKETCH5_W, SKETCH5_H)
        with Locations((-23.65, -14.7)):
            Rectangle(SKETCH5_W, SKETCH5_H)
    extrude(amount=F_32_40SWITCHCUTDETAIL_DEPTH, mode=Mode.SUBTRACT)

    # Sketch6 → Extrude1 (add)
    with BuildSketch(Plane.XZ.offset(31).offset(EXTRUDE1_START)):
        with Locations((71, -14)):
            Circle(SKETCH6_R)
    extrude(amount=-EXTRUDE1_DEPTH)

    # Sketch9 → Hole 5 (cut)
    with BuildSketch(Plane.XZ.offset(36)):
        with Locations((71, -14)):
            Circle(SKETCH9_R)
    extrude(amount=-HOLE_5_DEPTH, mode=Mode.SUBTRACT)


solid = part.part
